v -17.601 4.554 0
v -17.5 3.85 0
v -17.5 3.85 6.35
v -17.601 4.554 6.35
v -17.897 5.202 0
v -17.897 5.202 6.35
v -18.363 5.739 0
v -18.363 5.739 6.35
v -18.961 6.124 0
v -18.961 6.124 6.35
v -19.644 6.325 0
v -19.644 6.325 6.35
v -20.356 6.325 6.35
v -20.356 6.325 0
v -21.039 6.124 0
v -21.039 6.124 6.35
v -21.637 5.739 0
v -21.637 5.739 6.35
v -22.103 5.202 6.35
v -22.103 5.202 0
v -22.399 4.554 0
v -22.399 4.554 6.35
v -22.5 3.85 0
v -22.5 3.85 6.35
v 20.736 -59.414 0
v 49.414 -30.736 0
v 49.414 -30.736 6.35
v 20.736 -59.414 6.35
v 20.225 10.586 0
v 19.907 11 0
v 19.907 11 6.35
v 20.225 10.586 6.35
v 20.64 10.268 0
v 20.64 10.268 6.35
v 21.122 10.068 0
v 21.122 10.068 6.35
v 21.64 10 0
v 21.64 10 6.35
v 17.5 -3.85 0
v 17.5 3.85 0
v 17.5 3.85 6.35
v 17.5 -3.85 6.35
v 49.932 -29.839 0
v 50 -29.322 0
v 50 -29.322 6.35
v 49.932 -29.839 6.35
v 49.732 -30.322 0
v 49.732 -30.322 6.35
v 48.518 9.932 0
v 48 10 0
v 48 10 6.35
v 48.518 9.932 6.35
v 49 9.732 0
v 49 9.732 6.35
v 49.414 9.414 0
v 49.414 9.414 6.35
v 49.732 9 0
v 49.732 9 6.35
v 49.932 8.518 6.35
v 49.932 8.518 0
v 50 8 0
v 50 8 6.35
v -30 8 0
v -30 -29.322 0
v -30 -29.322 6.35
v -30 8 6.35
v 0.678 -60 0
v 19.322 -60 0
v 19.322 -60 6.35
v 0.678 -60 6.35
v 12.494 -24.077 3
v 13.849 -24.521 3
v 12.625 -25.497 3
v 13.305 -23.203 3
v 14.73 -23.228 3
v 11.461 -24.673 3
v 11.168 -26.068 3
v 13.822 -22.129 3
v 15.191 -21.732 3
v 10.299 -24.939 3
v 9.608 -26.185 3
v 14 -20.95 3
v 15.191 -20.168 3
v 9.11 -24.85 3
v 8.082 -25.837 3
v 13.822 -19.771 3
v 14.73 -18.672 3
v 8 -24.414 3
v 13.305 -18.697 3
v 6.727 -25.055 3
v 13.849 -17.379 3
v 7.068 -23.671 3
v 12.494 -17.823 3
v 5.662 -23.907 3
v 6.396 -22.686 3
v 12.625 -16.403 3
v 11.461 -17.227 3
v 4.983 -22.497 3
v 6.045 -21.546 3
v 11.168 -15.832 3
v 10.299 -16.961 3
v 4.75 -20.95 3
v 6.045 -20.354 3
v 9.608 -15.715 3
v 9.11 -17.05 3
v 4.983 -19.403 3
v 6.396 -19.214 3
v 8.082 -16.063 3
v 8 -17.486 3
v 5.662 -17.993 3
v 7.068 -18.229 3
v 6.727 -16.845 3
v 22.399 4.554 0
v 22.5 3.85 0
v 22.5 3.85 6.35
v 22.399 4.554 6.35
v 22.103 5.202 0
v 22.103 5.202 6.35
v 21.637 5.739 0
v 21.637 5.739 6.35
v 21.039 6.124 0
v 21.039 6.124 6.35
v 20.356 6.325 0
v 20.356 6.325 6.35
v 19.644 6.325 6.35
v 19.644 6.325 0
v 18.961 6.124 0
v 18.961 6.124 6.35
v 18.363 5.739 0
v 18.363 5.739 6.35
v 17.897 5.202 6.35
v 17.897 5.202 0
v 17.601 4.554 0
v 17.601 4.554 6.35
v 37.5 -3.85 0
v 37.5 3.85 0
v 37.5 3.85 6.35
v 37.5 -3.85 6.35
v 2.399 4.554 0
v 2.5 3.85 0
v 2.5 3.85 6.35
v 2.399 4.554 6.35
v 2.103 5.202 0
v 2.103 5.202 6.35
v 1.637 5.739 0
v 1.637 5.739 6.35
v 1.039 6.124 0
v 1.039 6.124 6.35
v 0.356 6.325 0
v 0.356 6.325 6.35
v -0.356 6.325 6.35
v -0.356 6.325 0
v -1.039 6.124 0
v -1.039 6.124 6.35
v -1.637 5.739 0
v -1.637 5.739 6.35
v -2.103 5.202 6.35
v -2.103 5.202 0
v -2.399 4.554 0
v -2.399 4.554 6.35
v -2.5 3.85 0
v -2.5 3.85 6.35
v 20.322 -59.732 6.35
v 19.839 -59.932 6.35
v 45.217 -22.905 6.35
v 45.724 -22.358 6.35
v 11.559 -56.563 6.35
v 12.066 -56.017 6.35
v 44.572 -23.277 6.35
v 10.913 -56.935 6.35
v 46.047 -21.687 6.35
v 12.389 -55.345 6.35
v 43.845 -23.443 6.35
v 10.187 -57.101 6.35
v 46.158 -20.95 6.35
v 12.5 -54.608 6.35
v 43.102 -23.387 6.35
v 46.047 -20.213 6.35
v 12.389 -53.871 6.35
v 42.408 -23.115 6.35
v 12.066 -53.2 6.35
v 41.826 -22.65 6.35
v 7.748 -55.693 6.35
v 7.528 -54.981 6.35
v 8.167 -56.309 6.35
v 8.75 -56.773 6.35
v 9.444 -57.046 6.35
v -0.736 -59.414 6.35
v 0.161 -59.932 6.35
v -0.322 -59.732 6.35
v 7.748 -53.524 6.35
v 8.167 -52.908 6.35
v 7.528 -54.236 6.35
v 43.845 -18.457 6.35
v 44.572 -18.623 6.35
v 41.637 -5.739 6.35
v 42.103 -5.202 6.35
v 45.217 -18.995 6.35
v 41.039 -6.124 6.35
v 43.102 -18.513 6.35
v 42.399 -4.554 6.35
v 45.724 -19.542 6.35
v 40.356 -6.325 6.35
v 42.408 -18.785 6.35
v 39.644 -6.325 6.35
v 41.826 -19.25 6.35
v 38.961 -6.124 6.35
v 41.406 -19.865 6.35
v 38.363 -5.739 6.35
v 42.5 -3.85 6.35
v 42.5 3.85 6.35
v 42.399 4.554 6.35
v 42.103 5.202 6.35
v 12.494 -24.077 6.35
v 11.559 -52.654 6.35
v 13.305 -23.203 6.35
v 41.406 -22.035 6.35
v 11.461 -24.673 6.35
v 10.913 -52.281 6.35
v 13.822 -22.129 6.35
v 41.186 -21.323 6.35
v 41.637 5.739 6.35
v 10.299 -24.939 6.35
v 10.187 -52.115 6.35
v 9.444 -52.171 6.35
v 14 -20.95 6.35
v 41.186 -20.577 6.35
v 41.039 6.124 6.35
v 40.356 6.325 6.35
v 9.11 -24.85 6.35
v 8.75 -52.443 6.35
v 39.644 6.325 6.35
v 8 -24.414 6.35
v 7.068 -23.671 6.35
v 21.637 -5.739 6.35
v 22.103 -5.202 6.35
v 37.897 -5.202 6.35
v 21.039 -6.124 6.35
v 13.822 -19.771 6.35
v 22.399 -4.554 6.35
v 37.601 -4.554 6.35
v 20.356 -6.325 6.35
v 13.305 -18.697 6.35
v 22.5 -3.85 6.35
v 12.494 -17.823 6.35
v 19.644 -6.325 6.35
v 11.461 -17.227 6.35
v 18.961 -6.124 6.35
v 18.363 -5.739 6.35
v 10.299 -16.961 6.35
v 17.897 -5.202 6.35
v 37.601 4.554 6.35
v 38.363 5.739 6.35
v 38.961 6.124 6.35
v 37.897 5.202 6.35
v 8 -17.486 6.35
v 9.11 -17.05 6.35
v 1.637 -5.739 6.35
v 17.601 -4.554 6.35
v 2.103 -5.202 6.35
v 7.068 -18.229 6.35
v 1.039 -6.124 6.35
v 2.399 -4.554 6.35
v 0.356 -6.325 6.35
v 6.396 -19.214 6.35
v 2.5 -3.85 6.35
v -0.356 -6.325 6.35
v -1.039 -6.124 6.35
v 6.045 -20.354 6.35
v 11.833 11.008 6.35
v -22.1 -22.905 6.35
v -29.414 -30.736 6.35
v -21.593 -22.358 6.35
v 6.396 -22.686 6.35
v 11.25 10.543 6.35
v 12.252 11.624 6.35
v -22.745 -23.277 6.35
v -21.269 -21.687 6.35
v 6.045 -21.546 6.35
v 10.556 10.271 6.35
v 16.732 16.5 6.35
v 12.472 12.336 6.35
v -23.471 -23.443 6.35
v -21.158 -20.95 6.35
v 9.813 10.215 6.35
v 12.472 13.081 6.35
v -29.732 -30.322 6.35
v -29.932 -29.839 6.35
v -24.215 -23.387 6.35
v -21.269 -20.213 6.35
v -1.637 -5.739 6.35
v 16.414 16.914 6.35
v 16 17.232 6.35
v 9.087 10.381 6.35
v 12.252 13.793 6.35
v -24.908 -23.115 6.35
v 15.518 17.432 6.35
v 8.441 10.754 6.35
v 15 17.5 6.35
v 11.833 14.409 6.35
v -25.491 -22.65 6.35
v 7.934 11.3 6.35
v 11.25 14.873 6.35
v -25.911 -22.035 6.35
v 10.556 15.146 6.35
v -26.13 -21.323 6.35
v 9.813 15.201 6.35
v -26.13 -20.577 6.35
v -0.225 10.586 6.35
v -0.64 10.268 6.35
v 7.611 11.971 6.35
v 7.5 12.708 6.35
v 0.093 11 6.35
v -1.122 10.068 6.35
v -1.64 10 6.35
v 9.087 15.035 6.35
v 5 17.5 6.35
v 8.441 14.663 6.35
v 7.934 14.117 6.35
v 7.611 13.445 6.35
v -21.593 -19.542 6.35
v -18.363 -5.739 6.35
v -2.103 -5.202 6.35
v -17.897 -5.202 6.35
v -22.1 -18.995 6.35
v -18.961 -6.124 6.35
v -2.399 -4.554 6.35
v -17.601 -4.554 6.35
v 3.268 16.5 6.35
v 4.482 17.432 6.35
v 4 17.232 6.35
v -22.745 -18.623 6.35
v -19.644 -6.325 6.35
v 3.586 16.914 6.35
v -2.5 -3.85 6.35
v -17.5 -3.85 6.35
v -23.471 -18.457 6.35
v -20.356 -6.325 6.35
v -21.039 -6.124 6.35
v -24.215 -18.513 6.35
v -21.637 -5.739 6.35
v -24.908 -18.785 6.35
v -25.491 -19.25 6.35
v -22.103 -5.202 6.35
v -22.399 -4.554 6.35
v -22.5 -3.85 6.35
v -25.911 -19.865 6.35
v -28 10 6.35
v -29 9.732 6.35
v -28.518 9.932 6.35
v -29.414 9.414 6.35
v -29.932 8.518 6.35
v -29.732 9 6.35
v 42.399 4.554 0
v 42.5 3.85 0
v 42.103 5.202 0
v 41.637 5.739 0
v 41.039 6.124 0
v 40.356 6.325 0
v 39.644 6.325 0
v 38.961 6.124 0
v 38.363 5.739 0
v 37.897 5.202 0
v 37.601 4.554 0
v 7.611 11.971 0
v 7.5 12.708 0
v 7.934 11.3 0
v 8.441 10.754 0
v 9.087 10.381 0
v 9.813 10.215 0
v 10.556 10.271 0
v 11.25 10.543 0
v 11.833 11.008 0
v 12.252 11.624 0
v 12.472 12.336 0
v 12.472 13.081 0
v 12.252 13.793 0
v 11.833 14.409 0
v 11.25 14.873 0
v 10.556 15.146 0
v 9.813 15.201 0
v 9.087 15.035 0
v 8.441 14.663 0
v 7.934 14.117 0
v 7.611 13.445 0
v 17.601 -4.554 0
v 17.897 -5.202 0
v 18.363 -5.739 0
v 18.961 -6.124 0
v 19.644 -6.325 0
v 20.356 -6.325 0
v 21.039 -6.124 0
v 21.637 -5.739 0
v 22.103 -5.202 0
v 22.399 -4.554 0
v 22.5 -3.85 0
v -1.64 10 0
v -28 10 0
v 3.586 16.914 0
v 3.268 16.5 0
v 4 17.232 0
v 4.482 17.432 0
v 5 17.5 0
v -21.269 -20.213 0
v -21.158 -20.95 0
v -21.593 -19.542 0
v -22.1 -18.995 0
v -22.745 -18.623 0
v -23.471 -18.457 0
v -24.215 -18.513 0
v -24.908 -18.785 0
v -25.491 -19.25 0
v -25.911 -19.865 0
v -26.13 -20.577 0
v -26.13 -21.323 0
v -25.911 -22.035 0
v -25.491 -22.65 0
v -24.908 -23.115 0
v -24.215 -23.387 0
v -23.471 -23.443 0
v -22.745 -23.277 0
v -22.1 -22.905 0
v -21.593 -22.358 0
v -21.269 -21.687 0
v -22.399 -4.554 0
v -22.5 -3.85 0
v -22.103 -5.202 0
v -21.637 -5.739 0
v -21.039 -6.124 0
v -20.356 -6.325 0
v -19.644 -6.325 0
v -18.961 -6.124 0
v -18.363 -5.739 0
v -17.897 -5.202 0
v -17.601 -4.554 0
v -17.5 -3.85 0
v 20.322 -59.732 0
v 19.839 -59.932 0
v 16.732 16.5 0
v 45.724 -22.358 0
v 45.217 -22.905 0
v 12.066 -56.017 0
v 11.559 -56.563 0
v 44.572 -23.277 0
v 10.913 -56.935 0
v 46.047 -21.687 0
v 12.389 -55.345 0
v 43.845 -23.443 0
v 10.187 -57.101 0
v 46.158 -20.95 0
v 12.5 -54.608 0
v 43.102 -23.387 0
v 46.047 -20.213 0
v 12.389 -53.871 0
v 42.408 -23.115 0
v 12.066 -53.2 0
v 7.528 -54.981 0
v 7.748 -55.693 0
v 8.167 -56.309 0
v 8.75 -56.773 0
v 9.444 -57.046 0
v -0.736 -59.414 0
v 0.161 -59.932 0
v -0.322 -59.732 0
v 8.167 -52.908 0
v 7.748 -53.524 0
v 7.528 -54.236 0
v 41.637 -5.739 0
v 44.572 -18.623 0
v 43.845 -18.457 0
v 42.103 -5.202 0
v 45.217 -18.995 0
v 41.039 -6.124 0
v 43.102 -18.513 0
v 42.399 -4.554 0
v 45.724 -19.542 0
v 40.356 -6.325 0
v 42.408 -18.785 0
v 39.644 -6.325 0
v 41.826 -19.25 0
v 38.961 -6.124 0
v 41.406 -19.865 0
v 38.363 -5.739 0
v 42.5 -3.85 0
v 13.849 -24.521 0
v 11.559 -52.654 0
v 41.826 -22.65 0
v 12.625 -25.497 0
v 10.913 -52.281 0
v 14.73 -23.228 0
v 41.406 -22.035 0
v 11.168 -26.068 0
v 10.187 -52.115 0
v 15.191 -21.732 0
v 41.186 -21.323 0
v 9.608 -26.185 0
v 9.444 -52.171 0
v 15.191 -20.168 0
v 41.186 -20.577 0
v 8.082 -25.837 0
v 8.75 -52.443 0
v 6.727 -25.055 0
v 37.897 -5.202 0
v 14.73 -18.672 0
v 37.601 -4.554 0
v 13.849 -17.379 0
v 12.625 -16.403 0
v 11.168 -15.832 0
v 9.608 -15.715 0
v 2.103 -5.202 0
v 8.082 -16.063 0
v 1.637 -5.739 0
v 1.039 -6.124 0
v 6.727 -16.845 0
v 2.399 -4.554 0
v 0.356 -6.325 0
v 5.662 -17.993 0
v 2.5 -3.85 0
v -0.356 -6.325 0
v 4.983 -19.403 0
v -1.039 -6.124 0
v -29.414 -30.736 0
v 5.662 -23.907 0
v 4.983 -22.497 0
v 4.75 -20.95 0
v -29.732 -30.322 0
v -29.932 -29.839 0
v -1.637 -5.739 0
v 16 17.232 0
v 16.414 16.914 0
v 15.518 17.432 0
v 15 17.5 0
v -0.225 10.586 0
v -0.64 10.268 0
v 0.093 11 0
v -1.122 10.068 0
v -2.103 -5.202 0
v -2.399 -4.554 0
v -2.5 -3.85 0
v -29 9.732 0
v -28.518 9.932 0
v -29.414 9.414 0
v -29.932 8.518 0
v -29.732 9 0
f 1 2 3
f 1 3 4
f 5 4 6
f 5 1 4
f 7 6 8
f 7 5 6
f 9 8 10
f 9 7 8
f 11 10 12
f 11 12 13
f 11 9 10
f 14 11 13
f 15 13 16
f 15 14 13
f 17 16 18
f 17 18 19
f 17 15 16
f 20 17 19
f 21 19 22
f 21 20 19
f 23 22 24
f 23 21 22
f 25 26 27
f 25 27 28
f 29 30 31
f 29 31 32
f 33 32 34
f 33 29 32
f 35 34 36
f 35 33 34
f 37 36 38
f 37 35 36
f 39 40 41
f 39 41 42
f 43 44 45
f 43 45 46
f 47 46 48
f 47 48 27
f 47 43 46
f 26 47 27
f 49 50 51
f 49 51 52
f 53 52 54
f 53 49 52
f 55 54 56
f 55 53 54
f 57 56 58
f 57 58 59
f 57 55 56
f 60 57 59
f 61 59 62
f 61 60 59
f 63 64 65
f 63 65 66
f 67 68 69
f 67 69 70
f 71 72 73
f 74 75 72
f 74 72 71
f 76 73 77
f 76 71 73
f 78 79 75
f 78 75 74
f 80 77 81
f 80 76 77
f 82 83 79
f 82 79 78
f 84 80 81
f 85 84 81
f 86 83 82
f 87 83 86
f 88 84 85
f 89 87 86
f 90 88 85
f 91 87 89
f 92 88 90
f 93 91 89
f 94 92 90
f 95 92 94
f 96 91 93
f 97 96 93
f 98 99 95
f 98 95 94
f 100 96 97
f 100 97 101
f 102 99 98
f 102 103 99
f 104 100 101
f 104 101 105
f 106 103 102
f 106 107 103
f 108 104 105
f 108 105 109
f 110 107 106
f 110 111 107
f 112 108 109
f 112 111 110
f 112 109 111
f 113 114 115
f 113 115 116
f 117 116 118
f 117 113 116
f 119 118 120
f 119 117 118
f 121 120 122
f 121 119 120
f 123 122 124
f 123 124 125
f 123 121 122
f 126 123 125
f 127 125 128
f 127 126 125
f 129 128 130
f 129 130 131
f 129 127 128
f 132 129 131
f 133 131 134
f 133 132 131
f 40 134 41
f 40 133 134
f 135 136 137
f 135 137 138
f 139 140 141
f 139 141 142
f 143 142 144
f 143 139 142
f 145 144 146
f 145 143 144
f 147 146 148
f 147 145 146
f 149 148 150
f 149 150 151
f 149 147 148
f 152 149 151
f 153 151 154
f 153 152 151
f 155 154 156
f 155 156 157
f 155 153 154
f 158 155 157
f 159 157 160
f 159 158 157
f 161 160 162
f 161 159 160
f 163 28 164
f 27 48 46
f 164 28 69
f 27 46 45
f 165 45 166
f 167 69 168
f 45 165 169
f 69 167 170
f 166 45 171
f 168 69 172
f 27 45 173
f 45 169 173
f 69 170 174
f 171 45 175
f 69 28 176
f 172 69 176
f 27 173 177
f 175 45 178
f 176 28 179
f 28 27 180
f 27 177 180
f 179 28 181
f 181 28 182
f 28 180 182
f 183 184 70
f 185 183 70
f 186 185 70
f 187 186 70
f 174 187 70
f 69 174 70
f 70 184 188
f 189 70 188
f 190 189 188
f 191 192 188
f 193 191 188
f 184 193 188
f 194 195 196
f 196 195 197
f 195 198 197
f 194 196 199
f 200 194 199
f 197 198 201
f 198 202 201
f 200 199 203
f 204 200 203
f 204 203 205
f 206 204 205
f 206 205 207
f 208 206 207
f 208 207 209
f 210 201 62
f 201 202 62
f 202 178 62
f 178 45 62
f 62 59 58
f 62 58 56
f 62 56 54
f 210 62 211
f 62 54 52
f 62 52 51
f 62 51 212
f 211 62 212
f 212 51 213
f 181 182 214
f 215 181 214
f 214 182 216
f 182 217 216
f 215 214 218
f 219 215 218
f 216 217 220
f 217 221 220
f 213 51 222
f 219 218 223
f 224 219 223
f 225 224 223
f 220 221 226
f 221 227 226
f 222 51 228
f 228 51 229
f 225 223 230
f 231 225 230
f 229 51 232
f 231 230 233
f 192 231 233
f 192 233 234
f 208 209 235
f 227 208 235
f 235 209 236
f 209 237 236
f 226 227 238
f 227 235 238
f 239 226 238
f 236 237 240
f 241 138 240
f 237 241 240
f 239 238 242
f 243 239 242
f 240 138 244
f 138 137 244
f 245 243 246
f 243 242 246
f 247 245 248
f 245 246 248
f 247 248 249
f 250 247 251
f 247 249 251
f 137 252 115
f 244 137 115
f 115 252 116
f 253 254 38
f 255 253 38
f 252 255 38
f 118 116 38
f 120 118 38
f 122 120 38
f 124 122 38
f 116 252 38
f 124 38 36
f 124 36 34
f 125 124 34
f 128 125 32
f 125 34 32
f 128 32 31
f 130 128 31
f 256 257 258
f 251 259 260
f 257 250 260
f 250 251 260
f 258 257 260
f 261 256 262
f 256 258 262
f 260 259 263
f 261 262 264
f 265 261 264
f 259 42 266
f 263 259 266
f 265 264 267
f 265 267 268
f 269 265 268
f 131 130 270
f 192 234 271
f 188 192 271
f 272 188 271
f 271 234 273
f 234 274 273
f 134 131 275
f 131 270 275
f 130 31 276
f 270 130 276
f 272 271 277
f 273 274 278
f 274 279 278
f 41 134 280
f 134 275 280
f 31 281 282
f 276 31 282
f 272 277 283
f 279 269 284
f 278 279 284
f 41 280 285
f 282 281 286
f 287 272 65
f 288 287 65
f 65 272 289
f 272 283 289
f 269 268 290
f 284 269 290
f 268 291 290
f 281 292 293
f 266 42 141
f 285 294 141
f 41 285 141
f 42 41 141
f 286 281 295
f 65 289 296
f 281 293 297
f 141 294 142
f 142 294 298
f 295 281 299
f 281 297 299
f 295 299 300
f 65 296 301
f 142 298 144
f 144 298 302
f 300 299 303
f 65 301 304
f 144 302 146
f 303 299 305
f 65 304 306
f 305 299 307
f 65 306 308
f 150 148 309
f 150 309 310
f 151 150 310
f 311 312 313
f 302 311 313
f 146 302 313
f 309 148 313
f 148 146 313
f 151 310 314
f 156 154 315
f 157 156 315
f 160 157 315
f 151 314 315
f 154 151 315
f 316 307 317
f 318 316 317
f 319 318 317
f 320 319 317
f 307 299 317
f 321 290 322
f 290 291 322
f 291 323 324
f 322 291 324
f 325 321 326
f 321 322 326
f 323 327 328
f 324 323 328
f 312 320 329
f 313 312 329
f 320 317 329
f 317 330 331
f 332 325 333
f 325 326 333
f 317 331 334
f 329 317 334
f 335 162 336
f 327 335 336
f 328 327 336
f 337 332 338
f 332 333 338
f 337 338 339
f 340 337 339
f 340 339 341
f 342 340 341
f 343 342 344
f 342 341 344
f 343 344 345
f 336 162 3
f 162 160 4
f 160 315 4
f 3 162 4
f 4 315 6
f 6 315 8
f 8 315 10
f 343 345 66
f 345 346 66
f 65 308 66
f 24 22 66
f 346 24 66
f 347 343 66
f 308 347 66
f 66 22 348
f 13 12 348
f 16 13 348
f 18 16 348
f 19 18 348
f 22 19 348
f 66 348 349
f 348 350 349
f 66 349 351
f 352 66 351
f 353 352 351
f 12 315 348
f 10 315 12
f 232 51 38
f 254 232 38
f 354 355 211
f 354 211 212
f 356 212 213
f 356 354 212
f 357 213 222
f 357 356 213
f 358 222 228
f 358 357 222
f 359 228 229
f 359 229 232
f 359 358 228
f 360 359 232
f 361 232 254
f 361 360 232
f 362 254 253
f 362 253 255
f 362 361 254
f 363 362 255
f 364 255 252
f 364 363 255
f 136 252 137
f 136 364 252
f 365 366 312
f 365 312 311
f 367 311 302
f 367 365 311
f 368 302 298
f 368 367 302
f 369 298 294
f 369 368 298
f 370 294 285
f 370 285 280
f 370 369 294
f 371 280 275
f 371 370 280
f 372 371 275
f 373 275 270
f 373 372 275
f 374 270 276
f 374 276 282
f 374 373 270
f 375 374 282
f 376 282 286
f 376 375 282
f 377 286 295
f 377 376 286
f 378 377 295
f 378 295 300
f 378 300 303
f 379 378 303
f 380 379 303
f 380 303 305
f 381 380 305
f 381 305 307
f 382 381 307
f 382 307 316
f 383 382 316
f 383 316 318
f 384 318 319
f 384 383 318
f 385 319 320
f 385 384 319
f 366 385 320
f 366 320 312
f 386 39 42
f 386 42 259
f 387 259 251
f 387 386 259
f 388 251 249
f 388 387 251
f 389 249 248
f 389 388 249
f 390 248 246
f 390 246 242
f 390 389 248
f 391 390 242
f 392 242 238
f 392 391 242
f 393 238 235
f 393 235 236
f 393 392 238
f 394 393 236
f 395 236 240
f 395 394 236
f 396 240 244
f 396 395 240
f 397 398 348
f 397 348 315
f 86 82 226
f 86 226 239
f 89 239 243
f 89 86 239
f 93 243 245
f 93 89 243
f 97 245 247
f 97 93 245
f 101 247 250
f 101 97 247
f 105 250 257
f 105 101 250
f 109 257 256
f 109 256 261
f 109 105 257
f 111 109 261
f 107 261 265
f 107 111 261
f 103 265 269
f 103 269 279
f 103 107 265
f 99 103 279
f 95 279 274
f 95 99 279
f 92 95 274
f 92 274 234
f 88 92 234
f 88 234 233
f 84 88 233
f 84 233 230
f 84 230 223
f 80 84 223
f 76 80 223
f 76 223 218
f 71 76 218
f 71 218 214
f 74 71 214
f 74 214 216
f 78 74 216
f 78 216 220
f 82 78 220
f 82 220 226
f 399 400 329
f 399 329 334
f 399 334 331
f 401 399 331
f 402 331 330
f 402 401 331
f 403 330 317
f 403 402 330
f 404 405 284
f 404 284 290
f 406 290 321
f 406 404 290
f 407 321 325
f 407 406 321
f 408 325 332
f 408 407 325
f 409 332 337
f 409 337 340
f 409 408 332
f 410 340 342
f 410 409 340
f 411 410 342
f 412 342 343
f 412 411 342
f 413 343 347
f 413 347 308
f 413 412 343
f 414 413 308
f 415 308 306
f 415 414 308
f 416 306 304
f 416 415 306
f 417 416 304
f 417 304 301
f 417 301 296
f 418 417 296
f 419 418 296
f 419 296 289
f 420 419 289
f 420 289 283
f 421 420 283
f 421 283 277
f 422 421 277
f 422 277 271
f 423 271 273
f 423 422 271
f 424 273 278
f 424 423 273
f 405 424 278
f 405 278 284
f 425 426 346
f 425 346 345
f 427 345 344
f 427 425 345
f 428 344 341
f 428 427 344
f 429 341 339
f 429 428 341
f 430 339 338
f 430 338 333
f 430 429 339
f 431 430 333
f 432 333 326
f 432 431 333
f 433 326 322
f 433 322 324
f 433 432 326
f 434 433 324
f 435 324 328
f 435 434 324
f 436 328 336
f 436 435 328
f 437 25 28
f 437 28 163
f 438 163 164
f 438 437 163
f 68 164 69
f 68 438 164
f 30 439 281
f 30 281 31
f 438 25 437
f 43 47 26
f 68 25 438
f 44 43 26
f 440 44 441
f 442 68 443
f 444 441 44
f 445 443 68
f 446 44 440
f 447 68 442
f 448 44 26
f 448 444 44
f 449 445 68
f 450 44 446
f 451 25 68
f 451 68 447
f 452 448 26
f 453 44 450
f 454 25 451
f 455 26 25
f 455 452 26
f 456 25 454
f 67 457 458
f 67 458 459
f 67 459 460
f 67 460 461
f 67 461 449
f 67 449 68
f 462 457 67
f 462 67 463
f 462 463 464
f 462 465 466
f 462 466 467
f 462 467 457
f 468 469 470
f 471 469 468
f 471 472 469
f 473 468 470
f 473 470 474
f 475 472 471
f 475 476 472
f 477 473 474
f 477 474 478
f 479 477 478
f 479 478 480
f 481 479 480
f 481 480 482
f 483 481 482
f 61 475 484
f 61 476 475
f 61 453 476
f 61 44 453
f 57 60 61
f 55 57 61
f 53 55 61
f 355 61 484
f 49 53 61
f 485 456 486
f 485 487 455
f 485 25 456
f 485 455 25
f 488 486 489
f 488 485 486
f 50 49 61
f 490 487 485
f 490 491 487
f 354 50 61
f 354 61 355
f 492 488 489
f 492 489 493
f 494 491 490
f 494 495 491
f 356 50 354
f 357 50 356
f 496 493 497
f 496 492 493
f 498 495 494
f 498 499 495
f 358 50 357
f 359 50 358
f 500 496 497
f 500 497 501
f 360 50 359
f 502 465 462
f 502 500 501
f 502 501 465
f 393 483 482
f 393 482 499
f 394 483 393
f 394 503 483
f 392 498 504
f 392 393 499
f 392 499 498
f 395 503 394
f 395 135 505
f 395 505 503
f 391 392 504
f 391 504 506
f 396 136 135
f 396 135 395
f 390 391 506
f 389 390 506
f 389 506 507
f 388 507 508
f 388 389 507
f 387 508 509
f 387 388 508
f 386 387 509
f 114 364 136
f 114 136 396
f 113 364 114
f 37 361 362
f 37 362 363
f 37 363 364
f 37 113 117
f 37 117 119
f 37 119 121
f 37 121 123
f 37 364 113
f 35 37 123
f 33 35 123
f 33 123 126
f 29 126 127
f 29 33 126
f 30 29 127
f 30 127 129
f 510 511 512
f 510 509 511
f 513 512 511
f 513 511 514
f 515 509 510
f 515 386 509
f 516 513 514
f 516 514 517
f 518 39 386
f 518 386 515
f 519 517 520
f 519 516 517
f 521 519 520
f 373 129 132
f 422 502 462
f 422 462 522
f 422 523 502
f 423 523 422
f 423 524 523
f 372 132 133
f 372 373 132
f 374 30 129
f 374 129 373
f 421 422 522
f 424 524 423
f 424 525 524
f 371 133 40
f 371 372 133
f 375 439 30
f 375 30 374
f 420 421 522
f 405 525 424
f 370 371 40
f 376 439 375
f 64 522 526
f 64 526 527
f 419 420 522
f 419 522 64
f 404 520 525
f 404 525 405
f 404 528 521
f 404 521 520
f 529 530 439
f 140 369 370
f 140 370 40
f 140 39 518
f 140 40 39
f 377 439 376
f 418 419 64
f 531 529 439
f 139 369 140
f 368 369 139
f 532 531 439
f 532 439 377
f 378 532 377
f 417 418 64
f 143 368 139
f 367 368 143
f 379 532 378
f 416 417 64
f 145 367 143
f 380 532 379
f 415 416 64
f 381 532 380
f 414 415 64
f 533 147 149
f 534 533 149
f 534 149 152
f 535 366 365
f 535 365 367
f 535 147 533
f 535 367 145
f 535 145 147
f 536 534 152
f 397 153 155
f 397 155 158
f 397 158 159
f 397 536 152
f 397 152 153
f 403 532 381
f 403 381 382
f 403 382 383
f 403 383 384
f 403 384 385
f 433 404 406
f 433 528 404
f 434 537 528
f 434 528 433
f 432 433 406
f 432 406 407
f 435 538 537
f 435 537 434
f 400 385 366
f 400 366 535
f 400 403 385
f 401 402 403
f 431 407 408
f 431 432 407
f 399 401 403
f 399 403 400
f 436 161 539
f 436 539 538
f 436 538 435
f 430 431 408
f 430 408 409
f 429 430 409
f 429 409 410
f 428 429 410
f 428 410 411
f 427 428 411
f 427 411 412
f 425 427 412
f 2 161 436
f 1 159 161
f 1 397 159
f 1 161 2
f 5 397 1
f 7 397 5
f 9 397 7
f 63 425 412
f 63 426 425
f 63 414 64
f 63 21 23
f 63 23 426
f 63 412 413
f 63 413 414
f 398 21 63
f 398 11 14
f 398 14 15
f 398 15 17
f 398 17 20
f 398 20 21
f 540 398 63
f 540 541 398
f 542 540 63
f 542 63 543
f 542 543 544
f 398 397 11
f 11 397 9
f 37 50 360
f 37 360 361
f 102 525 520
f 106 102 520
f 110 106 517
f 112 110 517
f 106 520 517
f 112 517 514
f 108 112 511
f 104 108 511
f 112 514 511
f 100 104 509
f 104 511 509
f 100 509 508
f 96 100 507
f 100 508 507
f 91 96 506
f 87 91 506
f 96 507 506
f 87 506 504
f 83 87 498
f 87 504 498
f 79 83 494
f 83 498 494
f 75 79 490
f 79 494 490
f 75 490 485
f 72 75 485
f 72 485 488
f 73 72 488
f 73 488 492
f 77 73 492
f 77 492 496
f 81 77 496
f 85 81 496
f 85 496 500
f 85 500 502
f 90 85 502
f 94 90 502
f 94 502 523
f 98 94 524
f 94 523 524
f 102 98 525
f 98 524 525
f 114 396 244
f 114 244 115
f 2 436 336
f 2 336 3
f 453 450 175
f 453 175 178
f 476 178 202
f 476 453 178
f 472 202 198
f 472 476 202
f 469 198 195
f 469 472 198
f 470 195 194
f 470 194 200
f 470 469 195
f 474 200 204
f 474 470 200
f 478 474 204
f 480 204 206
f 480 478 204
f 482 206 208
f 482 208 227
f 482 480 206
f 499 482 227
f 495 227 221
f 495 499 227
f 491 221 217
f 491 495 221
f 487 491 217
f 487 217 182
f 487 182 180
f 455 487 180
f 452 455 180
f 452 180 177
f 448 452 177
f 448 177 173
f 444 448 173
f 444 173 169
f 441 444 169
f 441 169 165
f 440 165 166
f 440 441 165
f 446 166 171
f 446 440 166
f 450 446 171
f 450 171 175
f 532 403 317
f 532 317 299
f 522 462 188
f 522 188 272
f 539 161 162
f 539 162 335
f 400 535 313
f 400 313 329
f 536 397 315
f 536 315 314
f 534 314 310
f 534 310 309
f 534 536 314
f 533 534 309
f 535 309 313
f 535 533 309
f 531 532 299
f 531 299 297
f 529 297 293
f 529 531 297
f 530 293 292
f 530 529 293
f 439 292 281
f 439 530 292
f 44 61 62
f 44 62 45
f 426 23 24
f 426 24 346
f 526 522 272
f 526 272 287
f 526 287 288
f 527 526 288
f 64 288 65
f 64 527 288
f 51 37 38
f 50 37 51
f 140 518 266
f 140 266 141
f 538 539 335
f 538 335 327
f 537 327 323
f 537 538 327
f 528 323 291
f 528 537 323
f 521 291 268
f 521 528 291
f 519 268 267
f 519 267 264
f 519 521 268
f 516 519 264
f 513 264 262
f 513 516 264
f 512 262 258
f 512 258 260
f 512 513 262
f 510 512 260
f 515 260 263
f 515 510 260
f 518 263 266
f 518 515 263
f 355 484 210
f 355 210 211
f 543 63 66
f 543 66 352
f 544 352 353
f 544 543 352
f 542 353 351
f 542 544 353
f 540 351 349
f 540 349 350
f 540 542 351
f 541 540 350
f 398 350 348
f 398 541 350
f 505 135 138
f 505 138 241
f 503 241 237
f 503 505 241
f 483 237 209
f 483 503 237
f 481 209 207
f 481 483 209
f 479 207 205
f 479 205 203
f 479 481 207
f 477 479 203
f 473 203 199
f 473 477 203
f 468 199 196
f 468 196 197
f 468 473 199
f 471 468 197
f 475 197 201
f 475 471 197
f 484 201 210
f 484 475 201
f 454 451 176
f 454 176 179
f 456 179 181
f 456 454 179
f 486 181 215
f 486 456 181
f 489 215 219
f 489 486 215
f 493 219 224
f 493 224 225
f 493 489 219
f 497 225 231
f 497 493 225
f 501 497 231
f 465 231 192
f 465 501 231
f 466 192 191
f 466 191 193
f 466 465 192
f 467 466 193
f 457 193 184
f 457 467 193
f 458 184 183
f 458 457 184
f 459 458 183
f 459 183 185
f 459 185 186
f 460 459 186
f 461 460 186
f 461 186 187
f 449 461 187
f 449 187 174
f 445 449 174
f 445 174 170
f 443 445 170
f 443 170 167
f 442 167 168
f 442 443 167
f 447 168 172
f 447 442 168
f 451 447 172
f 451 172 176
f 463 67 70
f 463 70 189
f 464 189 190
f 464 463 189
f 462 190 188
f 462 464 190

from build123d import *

# Parameters (mm, degrees)
SKETCH1_R                 = 4
SKETCH1_R_2               = 2.5
BOSS_EXTRUDE1_DEPTH       = 6.35
F_5_0MM_DOWEL_SLOT1_DEPTH = 6.35
SKETCH5_R                 = 5.25
CUT_EXTRUDE1_DEPTH        = 3


# Read off the part's stored shape, not the designer's step: Ø5.0mm Dowel Slot1
with BuildPart() as part:
    # Sketch1 → Boss-Extrude1 (new body)
    with BuildSketch(Plane.XY):
        with BuildLine():
            Line((-27.999999098, 10), (-1.639527193, 10))
            ThreePointArc((-1.639527193, 10), (-0.639527193, 10.267949192), (0.092523614, 11))
            Line((0.092523614, 11), (3.267950095, 16.5))
            ThreePointArc((3.267950095, 16.5), (4.000000902, 17.232050808), (5.000000902, 17.5))
            Line((5.000000902, 17.5), (15.000000902, 17.5))
            ThreePointArc((15.000000902, 17.5), (16.000000902, 17.232050808), (16.73205171, 16.5))
            Line((16.73205171, 16.5), (19.907478191, 11))
            ThreePointArc((19.907478191, 11), (20.639528998, 10.267949192), (21.639528998, 10))
            Line((21.639528998, 10), (48.000000902, 10))
            ThreePointArc((48.000000902, 10), (49.414214465, 9.414213562), (50.000000902, 8))
            Line((50.000000902, 8), (50.000000902, -29.321572875))
            ThreePointArc((50.000000902, -29.321572875), (49.847759967, -30.08693974), (49.414214465, -30.735786438))
            Line((49.414214465, -30.735786438), (20.73578734, -59.414213562))
            ThreePointArc((20.73578734, -59.414213562), (20.086940642, -59.847759065), (19.321573778, -60))
            Line((19.321573778, -60), (0.678428027, -60))
            ThreePointArc((0.678428027, -60), (-0.086938838, -59.847759065), (-0.735785535, -59.414213562))
            Line((-0.735785535, -59.414213562), (-29.41421266, -30.735786438))
            ThreePointArc((-29.41421266, -30.735786438), (-29.847758163, -30.08693974), (-29.999999098, -29.321572875))
            Line((-29.999999098, -29.321572875), (-29.999999098, 8))
            ThreePointArc((-29.999999098, 8), (-29.41421266, 9.414213562), (-27.999999098, 10))
        make_face()
        with Locations((10.000000902, -20.95)):
            Circle(SKETCH1_R, mode=Mode.SUBTRACT)
        with Locations((43.658284542, -20.95)):
            Circle(SKETCH1_R_2, mode=Mode.SUBTRACT)
        with Locations((10.000000902, -54.608282784)):
            Circle(SKETCH1_R_2, mode=Mode.SUBTRACT)
        with Locations((-23.658282737, -20.95)):
            Circle(SKETCH1_R_2, mode=Mode.SUBTRACT)
        with Locations(Location((10.000000902, 12.708282784, 0), (0, 0, 180))):
            Circle(SKETCH1_R_2, mode=Mode.SUBTRACT)
    extrude(amount=BOSS_EXTRUDE1_DEPTH)

    # Ø5.0mm Dowel Slot1 outline → Ø5.0mm Dowel Slot1 (cut)
    with BuildSketch(Plane.XY):
        with BuildLine():
            Line((22.5, -3.85), (22.5, 3.85))
            ThreePointArc((22.5, 3.85), (20, 6.35), (17.5, 3.85))
            Line((17.5, 3.85), (17.5, -3.85))
            ThreePointArc((17.5, -3.85), (20, -6.35), (22.5, -3.85))
        make_face()
        with BuildLine():
            Line((-17.5, -3.85), (-17.5, 3.85))
            ThreePointArc((-17.5, 3.85), (-20, 6.35), (-22.5, 3.85))
            Line((-22.5, 3.85), (-22.5, -3.85))
            ThreePointArc((-22.5, -3.85), (-20, -6.35), (-17.5, -3.85))
        make_face()
        with BuildLine():
            Line((2.5, -3.85), (2.5, 3.85))
            ThreePointArc((2.5, 3.85), (0, 6.35), (-2.5, 3.85))
            Line((-2.5, 3.85), (-2.5, -3.85))
            ThreePointArc((-2.5, -3.85), (0, -6.35), (2.5, -3.85))
        make_face()
        with BuildLine():
            Line((42.5, -3.85), (42.5, 3.85))
            ThreePointArc((42.5, 3.85), (40, 6.35), (37.5, 3.85))
            Line((37.5, 3.85), (37.5, -3.85))
            ThreePointArc((37.5, -3.85), (40, -6.35), (42.5, -3.85))
        make_face()
    extrude(amount=F_5_0MM_DOWEL_SLOT1_DEPTH, mode=Mode.SUBTRACT)

    # Sketch5 → Cut-Extrude1 (cut)
    with BuildSketch(Plane(origin=(0, 0, 0), x_dir=(-1, 0, 0), z_dir=(0, 0, -1))):
        with Locations((-10.000000902, -20.95)):
            Circle(SKETCH5_R)
    extrude(amount=-CUT_EXTRUDE1_DEPTH, mode=Mode.SUBTRACT)


solid = part.part
